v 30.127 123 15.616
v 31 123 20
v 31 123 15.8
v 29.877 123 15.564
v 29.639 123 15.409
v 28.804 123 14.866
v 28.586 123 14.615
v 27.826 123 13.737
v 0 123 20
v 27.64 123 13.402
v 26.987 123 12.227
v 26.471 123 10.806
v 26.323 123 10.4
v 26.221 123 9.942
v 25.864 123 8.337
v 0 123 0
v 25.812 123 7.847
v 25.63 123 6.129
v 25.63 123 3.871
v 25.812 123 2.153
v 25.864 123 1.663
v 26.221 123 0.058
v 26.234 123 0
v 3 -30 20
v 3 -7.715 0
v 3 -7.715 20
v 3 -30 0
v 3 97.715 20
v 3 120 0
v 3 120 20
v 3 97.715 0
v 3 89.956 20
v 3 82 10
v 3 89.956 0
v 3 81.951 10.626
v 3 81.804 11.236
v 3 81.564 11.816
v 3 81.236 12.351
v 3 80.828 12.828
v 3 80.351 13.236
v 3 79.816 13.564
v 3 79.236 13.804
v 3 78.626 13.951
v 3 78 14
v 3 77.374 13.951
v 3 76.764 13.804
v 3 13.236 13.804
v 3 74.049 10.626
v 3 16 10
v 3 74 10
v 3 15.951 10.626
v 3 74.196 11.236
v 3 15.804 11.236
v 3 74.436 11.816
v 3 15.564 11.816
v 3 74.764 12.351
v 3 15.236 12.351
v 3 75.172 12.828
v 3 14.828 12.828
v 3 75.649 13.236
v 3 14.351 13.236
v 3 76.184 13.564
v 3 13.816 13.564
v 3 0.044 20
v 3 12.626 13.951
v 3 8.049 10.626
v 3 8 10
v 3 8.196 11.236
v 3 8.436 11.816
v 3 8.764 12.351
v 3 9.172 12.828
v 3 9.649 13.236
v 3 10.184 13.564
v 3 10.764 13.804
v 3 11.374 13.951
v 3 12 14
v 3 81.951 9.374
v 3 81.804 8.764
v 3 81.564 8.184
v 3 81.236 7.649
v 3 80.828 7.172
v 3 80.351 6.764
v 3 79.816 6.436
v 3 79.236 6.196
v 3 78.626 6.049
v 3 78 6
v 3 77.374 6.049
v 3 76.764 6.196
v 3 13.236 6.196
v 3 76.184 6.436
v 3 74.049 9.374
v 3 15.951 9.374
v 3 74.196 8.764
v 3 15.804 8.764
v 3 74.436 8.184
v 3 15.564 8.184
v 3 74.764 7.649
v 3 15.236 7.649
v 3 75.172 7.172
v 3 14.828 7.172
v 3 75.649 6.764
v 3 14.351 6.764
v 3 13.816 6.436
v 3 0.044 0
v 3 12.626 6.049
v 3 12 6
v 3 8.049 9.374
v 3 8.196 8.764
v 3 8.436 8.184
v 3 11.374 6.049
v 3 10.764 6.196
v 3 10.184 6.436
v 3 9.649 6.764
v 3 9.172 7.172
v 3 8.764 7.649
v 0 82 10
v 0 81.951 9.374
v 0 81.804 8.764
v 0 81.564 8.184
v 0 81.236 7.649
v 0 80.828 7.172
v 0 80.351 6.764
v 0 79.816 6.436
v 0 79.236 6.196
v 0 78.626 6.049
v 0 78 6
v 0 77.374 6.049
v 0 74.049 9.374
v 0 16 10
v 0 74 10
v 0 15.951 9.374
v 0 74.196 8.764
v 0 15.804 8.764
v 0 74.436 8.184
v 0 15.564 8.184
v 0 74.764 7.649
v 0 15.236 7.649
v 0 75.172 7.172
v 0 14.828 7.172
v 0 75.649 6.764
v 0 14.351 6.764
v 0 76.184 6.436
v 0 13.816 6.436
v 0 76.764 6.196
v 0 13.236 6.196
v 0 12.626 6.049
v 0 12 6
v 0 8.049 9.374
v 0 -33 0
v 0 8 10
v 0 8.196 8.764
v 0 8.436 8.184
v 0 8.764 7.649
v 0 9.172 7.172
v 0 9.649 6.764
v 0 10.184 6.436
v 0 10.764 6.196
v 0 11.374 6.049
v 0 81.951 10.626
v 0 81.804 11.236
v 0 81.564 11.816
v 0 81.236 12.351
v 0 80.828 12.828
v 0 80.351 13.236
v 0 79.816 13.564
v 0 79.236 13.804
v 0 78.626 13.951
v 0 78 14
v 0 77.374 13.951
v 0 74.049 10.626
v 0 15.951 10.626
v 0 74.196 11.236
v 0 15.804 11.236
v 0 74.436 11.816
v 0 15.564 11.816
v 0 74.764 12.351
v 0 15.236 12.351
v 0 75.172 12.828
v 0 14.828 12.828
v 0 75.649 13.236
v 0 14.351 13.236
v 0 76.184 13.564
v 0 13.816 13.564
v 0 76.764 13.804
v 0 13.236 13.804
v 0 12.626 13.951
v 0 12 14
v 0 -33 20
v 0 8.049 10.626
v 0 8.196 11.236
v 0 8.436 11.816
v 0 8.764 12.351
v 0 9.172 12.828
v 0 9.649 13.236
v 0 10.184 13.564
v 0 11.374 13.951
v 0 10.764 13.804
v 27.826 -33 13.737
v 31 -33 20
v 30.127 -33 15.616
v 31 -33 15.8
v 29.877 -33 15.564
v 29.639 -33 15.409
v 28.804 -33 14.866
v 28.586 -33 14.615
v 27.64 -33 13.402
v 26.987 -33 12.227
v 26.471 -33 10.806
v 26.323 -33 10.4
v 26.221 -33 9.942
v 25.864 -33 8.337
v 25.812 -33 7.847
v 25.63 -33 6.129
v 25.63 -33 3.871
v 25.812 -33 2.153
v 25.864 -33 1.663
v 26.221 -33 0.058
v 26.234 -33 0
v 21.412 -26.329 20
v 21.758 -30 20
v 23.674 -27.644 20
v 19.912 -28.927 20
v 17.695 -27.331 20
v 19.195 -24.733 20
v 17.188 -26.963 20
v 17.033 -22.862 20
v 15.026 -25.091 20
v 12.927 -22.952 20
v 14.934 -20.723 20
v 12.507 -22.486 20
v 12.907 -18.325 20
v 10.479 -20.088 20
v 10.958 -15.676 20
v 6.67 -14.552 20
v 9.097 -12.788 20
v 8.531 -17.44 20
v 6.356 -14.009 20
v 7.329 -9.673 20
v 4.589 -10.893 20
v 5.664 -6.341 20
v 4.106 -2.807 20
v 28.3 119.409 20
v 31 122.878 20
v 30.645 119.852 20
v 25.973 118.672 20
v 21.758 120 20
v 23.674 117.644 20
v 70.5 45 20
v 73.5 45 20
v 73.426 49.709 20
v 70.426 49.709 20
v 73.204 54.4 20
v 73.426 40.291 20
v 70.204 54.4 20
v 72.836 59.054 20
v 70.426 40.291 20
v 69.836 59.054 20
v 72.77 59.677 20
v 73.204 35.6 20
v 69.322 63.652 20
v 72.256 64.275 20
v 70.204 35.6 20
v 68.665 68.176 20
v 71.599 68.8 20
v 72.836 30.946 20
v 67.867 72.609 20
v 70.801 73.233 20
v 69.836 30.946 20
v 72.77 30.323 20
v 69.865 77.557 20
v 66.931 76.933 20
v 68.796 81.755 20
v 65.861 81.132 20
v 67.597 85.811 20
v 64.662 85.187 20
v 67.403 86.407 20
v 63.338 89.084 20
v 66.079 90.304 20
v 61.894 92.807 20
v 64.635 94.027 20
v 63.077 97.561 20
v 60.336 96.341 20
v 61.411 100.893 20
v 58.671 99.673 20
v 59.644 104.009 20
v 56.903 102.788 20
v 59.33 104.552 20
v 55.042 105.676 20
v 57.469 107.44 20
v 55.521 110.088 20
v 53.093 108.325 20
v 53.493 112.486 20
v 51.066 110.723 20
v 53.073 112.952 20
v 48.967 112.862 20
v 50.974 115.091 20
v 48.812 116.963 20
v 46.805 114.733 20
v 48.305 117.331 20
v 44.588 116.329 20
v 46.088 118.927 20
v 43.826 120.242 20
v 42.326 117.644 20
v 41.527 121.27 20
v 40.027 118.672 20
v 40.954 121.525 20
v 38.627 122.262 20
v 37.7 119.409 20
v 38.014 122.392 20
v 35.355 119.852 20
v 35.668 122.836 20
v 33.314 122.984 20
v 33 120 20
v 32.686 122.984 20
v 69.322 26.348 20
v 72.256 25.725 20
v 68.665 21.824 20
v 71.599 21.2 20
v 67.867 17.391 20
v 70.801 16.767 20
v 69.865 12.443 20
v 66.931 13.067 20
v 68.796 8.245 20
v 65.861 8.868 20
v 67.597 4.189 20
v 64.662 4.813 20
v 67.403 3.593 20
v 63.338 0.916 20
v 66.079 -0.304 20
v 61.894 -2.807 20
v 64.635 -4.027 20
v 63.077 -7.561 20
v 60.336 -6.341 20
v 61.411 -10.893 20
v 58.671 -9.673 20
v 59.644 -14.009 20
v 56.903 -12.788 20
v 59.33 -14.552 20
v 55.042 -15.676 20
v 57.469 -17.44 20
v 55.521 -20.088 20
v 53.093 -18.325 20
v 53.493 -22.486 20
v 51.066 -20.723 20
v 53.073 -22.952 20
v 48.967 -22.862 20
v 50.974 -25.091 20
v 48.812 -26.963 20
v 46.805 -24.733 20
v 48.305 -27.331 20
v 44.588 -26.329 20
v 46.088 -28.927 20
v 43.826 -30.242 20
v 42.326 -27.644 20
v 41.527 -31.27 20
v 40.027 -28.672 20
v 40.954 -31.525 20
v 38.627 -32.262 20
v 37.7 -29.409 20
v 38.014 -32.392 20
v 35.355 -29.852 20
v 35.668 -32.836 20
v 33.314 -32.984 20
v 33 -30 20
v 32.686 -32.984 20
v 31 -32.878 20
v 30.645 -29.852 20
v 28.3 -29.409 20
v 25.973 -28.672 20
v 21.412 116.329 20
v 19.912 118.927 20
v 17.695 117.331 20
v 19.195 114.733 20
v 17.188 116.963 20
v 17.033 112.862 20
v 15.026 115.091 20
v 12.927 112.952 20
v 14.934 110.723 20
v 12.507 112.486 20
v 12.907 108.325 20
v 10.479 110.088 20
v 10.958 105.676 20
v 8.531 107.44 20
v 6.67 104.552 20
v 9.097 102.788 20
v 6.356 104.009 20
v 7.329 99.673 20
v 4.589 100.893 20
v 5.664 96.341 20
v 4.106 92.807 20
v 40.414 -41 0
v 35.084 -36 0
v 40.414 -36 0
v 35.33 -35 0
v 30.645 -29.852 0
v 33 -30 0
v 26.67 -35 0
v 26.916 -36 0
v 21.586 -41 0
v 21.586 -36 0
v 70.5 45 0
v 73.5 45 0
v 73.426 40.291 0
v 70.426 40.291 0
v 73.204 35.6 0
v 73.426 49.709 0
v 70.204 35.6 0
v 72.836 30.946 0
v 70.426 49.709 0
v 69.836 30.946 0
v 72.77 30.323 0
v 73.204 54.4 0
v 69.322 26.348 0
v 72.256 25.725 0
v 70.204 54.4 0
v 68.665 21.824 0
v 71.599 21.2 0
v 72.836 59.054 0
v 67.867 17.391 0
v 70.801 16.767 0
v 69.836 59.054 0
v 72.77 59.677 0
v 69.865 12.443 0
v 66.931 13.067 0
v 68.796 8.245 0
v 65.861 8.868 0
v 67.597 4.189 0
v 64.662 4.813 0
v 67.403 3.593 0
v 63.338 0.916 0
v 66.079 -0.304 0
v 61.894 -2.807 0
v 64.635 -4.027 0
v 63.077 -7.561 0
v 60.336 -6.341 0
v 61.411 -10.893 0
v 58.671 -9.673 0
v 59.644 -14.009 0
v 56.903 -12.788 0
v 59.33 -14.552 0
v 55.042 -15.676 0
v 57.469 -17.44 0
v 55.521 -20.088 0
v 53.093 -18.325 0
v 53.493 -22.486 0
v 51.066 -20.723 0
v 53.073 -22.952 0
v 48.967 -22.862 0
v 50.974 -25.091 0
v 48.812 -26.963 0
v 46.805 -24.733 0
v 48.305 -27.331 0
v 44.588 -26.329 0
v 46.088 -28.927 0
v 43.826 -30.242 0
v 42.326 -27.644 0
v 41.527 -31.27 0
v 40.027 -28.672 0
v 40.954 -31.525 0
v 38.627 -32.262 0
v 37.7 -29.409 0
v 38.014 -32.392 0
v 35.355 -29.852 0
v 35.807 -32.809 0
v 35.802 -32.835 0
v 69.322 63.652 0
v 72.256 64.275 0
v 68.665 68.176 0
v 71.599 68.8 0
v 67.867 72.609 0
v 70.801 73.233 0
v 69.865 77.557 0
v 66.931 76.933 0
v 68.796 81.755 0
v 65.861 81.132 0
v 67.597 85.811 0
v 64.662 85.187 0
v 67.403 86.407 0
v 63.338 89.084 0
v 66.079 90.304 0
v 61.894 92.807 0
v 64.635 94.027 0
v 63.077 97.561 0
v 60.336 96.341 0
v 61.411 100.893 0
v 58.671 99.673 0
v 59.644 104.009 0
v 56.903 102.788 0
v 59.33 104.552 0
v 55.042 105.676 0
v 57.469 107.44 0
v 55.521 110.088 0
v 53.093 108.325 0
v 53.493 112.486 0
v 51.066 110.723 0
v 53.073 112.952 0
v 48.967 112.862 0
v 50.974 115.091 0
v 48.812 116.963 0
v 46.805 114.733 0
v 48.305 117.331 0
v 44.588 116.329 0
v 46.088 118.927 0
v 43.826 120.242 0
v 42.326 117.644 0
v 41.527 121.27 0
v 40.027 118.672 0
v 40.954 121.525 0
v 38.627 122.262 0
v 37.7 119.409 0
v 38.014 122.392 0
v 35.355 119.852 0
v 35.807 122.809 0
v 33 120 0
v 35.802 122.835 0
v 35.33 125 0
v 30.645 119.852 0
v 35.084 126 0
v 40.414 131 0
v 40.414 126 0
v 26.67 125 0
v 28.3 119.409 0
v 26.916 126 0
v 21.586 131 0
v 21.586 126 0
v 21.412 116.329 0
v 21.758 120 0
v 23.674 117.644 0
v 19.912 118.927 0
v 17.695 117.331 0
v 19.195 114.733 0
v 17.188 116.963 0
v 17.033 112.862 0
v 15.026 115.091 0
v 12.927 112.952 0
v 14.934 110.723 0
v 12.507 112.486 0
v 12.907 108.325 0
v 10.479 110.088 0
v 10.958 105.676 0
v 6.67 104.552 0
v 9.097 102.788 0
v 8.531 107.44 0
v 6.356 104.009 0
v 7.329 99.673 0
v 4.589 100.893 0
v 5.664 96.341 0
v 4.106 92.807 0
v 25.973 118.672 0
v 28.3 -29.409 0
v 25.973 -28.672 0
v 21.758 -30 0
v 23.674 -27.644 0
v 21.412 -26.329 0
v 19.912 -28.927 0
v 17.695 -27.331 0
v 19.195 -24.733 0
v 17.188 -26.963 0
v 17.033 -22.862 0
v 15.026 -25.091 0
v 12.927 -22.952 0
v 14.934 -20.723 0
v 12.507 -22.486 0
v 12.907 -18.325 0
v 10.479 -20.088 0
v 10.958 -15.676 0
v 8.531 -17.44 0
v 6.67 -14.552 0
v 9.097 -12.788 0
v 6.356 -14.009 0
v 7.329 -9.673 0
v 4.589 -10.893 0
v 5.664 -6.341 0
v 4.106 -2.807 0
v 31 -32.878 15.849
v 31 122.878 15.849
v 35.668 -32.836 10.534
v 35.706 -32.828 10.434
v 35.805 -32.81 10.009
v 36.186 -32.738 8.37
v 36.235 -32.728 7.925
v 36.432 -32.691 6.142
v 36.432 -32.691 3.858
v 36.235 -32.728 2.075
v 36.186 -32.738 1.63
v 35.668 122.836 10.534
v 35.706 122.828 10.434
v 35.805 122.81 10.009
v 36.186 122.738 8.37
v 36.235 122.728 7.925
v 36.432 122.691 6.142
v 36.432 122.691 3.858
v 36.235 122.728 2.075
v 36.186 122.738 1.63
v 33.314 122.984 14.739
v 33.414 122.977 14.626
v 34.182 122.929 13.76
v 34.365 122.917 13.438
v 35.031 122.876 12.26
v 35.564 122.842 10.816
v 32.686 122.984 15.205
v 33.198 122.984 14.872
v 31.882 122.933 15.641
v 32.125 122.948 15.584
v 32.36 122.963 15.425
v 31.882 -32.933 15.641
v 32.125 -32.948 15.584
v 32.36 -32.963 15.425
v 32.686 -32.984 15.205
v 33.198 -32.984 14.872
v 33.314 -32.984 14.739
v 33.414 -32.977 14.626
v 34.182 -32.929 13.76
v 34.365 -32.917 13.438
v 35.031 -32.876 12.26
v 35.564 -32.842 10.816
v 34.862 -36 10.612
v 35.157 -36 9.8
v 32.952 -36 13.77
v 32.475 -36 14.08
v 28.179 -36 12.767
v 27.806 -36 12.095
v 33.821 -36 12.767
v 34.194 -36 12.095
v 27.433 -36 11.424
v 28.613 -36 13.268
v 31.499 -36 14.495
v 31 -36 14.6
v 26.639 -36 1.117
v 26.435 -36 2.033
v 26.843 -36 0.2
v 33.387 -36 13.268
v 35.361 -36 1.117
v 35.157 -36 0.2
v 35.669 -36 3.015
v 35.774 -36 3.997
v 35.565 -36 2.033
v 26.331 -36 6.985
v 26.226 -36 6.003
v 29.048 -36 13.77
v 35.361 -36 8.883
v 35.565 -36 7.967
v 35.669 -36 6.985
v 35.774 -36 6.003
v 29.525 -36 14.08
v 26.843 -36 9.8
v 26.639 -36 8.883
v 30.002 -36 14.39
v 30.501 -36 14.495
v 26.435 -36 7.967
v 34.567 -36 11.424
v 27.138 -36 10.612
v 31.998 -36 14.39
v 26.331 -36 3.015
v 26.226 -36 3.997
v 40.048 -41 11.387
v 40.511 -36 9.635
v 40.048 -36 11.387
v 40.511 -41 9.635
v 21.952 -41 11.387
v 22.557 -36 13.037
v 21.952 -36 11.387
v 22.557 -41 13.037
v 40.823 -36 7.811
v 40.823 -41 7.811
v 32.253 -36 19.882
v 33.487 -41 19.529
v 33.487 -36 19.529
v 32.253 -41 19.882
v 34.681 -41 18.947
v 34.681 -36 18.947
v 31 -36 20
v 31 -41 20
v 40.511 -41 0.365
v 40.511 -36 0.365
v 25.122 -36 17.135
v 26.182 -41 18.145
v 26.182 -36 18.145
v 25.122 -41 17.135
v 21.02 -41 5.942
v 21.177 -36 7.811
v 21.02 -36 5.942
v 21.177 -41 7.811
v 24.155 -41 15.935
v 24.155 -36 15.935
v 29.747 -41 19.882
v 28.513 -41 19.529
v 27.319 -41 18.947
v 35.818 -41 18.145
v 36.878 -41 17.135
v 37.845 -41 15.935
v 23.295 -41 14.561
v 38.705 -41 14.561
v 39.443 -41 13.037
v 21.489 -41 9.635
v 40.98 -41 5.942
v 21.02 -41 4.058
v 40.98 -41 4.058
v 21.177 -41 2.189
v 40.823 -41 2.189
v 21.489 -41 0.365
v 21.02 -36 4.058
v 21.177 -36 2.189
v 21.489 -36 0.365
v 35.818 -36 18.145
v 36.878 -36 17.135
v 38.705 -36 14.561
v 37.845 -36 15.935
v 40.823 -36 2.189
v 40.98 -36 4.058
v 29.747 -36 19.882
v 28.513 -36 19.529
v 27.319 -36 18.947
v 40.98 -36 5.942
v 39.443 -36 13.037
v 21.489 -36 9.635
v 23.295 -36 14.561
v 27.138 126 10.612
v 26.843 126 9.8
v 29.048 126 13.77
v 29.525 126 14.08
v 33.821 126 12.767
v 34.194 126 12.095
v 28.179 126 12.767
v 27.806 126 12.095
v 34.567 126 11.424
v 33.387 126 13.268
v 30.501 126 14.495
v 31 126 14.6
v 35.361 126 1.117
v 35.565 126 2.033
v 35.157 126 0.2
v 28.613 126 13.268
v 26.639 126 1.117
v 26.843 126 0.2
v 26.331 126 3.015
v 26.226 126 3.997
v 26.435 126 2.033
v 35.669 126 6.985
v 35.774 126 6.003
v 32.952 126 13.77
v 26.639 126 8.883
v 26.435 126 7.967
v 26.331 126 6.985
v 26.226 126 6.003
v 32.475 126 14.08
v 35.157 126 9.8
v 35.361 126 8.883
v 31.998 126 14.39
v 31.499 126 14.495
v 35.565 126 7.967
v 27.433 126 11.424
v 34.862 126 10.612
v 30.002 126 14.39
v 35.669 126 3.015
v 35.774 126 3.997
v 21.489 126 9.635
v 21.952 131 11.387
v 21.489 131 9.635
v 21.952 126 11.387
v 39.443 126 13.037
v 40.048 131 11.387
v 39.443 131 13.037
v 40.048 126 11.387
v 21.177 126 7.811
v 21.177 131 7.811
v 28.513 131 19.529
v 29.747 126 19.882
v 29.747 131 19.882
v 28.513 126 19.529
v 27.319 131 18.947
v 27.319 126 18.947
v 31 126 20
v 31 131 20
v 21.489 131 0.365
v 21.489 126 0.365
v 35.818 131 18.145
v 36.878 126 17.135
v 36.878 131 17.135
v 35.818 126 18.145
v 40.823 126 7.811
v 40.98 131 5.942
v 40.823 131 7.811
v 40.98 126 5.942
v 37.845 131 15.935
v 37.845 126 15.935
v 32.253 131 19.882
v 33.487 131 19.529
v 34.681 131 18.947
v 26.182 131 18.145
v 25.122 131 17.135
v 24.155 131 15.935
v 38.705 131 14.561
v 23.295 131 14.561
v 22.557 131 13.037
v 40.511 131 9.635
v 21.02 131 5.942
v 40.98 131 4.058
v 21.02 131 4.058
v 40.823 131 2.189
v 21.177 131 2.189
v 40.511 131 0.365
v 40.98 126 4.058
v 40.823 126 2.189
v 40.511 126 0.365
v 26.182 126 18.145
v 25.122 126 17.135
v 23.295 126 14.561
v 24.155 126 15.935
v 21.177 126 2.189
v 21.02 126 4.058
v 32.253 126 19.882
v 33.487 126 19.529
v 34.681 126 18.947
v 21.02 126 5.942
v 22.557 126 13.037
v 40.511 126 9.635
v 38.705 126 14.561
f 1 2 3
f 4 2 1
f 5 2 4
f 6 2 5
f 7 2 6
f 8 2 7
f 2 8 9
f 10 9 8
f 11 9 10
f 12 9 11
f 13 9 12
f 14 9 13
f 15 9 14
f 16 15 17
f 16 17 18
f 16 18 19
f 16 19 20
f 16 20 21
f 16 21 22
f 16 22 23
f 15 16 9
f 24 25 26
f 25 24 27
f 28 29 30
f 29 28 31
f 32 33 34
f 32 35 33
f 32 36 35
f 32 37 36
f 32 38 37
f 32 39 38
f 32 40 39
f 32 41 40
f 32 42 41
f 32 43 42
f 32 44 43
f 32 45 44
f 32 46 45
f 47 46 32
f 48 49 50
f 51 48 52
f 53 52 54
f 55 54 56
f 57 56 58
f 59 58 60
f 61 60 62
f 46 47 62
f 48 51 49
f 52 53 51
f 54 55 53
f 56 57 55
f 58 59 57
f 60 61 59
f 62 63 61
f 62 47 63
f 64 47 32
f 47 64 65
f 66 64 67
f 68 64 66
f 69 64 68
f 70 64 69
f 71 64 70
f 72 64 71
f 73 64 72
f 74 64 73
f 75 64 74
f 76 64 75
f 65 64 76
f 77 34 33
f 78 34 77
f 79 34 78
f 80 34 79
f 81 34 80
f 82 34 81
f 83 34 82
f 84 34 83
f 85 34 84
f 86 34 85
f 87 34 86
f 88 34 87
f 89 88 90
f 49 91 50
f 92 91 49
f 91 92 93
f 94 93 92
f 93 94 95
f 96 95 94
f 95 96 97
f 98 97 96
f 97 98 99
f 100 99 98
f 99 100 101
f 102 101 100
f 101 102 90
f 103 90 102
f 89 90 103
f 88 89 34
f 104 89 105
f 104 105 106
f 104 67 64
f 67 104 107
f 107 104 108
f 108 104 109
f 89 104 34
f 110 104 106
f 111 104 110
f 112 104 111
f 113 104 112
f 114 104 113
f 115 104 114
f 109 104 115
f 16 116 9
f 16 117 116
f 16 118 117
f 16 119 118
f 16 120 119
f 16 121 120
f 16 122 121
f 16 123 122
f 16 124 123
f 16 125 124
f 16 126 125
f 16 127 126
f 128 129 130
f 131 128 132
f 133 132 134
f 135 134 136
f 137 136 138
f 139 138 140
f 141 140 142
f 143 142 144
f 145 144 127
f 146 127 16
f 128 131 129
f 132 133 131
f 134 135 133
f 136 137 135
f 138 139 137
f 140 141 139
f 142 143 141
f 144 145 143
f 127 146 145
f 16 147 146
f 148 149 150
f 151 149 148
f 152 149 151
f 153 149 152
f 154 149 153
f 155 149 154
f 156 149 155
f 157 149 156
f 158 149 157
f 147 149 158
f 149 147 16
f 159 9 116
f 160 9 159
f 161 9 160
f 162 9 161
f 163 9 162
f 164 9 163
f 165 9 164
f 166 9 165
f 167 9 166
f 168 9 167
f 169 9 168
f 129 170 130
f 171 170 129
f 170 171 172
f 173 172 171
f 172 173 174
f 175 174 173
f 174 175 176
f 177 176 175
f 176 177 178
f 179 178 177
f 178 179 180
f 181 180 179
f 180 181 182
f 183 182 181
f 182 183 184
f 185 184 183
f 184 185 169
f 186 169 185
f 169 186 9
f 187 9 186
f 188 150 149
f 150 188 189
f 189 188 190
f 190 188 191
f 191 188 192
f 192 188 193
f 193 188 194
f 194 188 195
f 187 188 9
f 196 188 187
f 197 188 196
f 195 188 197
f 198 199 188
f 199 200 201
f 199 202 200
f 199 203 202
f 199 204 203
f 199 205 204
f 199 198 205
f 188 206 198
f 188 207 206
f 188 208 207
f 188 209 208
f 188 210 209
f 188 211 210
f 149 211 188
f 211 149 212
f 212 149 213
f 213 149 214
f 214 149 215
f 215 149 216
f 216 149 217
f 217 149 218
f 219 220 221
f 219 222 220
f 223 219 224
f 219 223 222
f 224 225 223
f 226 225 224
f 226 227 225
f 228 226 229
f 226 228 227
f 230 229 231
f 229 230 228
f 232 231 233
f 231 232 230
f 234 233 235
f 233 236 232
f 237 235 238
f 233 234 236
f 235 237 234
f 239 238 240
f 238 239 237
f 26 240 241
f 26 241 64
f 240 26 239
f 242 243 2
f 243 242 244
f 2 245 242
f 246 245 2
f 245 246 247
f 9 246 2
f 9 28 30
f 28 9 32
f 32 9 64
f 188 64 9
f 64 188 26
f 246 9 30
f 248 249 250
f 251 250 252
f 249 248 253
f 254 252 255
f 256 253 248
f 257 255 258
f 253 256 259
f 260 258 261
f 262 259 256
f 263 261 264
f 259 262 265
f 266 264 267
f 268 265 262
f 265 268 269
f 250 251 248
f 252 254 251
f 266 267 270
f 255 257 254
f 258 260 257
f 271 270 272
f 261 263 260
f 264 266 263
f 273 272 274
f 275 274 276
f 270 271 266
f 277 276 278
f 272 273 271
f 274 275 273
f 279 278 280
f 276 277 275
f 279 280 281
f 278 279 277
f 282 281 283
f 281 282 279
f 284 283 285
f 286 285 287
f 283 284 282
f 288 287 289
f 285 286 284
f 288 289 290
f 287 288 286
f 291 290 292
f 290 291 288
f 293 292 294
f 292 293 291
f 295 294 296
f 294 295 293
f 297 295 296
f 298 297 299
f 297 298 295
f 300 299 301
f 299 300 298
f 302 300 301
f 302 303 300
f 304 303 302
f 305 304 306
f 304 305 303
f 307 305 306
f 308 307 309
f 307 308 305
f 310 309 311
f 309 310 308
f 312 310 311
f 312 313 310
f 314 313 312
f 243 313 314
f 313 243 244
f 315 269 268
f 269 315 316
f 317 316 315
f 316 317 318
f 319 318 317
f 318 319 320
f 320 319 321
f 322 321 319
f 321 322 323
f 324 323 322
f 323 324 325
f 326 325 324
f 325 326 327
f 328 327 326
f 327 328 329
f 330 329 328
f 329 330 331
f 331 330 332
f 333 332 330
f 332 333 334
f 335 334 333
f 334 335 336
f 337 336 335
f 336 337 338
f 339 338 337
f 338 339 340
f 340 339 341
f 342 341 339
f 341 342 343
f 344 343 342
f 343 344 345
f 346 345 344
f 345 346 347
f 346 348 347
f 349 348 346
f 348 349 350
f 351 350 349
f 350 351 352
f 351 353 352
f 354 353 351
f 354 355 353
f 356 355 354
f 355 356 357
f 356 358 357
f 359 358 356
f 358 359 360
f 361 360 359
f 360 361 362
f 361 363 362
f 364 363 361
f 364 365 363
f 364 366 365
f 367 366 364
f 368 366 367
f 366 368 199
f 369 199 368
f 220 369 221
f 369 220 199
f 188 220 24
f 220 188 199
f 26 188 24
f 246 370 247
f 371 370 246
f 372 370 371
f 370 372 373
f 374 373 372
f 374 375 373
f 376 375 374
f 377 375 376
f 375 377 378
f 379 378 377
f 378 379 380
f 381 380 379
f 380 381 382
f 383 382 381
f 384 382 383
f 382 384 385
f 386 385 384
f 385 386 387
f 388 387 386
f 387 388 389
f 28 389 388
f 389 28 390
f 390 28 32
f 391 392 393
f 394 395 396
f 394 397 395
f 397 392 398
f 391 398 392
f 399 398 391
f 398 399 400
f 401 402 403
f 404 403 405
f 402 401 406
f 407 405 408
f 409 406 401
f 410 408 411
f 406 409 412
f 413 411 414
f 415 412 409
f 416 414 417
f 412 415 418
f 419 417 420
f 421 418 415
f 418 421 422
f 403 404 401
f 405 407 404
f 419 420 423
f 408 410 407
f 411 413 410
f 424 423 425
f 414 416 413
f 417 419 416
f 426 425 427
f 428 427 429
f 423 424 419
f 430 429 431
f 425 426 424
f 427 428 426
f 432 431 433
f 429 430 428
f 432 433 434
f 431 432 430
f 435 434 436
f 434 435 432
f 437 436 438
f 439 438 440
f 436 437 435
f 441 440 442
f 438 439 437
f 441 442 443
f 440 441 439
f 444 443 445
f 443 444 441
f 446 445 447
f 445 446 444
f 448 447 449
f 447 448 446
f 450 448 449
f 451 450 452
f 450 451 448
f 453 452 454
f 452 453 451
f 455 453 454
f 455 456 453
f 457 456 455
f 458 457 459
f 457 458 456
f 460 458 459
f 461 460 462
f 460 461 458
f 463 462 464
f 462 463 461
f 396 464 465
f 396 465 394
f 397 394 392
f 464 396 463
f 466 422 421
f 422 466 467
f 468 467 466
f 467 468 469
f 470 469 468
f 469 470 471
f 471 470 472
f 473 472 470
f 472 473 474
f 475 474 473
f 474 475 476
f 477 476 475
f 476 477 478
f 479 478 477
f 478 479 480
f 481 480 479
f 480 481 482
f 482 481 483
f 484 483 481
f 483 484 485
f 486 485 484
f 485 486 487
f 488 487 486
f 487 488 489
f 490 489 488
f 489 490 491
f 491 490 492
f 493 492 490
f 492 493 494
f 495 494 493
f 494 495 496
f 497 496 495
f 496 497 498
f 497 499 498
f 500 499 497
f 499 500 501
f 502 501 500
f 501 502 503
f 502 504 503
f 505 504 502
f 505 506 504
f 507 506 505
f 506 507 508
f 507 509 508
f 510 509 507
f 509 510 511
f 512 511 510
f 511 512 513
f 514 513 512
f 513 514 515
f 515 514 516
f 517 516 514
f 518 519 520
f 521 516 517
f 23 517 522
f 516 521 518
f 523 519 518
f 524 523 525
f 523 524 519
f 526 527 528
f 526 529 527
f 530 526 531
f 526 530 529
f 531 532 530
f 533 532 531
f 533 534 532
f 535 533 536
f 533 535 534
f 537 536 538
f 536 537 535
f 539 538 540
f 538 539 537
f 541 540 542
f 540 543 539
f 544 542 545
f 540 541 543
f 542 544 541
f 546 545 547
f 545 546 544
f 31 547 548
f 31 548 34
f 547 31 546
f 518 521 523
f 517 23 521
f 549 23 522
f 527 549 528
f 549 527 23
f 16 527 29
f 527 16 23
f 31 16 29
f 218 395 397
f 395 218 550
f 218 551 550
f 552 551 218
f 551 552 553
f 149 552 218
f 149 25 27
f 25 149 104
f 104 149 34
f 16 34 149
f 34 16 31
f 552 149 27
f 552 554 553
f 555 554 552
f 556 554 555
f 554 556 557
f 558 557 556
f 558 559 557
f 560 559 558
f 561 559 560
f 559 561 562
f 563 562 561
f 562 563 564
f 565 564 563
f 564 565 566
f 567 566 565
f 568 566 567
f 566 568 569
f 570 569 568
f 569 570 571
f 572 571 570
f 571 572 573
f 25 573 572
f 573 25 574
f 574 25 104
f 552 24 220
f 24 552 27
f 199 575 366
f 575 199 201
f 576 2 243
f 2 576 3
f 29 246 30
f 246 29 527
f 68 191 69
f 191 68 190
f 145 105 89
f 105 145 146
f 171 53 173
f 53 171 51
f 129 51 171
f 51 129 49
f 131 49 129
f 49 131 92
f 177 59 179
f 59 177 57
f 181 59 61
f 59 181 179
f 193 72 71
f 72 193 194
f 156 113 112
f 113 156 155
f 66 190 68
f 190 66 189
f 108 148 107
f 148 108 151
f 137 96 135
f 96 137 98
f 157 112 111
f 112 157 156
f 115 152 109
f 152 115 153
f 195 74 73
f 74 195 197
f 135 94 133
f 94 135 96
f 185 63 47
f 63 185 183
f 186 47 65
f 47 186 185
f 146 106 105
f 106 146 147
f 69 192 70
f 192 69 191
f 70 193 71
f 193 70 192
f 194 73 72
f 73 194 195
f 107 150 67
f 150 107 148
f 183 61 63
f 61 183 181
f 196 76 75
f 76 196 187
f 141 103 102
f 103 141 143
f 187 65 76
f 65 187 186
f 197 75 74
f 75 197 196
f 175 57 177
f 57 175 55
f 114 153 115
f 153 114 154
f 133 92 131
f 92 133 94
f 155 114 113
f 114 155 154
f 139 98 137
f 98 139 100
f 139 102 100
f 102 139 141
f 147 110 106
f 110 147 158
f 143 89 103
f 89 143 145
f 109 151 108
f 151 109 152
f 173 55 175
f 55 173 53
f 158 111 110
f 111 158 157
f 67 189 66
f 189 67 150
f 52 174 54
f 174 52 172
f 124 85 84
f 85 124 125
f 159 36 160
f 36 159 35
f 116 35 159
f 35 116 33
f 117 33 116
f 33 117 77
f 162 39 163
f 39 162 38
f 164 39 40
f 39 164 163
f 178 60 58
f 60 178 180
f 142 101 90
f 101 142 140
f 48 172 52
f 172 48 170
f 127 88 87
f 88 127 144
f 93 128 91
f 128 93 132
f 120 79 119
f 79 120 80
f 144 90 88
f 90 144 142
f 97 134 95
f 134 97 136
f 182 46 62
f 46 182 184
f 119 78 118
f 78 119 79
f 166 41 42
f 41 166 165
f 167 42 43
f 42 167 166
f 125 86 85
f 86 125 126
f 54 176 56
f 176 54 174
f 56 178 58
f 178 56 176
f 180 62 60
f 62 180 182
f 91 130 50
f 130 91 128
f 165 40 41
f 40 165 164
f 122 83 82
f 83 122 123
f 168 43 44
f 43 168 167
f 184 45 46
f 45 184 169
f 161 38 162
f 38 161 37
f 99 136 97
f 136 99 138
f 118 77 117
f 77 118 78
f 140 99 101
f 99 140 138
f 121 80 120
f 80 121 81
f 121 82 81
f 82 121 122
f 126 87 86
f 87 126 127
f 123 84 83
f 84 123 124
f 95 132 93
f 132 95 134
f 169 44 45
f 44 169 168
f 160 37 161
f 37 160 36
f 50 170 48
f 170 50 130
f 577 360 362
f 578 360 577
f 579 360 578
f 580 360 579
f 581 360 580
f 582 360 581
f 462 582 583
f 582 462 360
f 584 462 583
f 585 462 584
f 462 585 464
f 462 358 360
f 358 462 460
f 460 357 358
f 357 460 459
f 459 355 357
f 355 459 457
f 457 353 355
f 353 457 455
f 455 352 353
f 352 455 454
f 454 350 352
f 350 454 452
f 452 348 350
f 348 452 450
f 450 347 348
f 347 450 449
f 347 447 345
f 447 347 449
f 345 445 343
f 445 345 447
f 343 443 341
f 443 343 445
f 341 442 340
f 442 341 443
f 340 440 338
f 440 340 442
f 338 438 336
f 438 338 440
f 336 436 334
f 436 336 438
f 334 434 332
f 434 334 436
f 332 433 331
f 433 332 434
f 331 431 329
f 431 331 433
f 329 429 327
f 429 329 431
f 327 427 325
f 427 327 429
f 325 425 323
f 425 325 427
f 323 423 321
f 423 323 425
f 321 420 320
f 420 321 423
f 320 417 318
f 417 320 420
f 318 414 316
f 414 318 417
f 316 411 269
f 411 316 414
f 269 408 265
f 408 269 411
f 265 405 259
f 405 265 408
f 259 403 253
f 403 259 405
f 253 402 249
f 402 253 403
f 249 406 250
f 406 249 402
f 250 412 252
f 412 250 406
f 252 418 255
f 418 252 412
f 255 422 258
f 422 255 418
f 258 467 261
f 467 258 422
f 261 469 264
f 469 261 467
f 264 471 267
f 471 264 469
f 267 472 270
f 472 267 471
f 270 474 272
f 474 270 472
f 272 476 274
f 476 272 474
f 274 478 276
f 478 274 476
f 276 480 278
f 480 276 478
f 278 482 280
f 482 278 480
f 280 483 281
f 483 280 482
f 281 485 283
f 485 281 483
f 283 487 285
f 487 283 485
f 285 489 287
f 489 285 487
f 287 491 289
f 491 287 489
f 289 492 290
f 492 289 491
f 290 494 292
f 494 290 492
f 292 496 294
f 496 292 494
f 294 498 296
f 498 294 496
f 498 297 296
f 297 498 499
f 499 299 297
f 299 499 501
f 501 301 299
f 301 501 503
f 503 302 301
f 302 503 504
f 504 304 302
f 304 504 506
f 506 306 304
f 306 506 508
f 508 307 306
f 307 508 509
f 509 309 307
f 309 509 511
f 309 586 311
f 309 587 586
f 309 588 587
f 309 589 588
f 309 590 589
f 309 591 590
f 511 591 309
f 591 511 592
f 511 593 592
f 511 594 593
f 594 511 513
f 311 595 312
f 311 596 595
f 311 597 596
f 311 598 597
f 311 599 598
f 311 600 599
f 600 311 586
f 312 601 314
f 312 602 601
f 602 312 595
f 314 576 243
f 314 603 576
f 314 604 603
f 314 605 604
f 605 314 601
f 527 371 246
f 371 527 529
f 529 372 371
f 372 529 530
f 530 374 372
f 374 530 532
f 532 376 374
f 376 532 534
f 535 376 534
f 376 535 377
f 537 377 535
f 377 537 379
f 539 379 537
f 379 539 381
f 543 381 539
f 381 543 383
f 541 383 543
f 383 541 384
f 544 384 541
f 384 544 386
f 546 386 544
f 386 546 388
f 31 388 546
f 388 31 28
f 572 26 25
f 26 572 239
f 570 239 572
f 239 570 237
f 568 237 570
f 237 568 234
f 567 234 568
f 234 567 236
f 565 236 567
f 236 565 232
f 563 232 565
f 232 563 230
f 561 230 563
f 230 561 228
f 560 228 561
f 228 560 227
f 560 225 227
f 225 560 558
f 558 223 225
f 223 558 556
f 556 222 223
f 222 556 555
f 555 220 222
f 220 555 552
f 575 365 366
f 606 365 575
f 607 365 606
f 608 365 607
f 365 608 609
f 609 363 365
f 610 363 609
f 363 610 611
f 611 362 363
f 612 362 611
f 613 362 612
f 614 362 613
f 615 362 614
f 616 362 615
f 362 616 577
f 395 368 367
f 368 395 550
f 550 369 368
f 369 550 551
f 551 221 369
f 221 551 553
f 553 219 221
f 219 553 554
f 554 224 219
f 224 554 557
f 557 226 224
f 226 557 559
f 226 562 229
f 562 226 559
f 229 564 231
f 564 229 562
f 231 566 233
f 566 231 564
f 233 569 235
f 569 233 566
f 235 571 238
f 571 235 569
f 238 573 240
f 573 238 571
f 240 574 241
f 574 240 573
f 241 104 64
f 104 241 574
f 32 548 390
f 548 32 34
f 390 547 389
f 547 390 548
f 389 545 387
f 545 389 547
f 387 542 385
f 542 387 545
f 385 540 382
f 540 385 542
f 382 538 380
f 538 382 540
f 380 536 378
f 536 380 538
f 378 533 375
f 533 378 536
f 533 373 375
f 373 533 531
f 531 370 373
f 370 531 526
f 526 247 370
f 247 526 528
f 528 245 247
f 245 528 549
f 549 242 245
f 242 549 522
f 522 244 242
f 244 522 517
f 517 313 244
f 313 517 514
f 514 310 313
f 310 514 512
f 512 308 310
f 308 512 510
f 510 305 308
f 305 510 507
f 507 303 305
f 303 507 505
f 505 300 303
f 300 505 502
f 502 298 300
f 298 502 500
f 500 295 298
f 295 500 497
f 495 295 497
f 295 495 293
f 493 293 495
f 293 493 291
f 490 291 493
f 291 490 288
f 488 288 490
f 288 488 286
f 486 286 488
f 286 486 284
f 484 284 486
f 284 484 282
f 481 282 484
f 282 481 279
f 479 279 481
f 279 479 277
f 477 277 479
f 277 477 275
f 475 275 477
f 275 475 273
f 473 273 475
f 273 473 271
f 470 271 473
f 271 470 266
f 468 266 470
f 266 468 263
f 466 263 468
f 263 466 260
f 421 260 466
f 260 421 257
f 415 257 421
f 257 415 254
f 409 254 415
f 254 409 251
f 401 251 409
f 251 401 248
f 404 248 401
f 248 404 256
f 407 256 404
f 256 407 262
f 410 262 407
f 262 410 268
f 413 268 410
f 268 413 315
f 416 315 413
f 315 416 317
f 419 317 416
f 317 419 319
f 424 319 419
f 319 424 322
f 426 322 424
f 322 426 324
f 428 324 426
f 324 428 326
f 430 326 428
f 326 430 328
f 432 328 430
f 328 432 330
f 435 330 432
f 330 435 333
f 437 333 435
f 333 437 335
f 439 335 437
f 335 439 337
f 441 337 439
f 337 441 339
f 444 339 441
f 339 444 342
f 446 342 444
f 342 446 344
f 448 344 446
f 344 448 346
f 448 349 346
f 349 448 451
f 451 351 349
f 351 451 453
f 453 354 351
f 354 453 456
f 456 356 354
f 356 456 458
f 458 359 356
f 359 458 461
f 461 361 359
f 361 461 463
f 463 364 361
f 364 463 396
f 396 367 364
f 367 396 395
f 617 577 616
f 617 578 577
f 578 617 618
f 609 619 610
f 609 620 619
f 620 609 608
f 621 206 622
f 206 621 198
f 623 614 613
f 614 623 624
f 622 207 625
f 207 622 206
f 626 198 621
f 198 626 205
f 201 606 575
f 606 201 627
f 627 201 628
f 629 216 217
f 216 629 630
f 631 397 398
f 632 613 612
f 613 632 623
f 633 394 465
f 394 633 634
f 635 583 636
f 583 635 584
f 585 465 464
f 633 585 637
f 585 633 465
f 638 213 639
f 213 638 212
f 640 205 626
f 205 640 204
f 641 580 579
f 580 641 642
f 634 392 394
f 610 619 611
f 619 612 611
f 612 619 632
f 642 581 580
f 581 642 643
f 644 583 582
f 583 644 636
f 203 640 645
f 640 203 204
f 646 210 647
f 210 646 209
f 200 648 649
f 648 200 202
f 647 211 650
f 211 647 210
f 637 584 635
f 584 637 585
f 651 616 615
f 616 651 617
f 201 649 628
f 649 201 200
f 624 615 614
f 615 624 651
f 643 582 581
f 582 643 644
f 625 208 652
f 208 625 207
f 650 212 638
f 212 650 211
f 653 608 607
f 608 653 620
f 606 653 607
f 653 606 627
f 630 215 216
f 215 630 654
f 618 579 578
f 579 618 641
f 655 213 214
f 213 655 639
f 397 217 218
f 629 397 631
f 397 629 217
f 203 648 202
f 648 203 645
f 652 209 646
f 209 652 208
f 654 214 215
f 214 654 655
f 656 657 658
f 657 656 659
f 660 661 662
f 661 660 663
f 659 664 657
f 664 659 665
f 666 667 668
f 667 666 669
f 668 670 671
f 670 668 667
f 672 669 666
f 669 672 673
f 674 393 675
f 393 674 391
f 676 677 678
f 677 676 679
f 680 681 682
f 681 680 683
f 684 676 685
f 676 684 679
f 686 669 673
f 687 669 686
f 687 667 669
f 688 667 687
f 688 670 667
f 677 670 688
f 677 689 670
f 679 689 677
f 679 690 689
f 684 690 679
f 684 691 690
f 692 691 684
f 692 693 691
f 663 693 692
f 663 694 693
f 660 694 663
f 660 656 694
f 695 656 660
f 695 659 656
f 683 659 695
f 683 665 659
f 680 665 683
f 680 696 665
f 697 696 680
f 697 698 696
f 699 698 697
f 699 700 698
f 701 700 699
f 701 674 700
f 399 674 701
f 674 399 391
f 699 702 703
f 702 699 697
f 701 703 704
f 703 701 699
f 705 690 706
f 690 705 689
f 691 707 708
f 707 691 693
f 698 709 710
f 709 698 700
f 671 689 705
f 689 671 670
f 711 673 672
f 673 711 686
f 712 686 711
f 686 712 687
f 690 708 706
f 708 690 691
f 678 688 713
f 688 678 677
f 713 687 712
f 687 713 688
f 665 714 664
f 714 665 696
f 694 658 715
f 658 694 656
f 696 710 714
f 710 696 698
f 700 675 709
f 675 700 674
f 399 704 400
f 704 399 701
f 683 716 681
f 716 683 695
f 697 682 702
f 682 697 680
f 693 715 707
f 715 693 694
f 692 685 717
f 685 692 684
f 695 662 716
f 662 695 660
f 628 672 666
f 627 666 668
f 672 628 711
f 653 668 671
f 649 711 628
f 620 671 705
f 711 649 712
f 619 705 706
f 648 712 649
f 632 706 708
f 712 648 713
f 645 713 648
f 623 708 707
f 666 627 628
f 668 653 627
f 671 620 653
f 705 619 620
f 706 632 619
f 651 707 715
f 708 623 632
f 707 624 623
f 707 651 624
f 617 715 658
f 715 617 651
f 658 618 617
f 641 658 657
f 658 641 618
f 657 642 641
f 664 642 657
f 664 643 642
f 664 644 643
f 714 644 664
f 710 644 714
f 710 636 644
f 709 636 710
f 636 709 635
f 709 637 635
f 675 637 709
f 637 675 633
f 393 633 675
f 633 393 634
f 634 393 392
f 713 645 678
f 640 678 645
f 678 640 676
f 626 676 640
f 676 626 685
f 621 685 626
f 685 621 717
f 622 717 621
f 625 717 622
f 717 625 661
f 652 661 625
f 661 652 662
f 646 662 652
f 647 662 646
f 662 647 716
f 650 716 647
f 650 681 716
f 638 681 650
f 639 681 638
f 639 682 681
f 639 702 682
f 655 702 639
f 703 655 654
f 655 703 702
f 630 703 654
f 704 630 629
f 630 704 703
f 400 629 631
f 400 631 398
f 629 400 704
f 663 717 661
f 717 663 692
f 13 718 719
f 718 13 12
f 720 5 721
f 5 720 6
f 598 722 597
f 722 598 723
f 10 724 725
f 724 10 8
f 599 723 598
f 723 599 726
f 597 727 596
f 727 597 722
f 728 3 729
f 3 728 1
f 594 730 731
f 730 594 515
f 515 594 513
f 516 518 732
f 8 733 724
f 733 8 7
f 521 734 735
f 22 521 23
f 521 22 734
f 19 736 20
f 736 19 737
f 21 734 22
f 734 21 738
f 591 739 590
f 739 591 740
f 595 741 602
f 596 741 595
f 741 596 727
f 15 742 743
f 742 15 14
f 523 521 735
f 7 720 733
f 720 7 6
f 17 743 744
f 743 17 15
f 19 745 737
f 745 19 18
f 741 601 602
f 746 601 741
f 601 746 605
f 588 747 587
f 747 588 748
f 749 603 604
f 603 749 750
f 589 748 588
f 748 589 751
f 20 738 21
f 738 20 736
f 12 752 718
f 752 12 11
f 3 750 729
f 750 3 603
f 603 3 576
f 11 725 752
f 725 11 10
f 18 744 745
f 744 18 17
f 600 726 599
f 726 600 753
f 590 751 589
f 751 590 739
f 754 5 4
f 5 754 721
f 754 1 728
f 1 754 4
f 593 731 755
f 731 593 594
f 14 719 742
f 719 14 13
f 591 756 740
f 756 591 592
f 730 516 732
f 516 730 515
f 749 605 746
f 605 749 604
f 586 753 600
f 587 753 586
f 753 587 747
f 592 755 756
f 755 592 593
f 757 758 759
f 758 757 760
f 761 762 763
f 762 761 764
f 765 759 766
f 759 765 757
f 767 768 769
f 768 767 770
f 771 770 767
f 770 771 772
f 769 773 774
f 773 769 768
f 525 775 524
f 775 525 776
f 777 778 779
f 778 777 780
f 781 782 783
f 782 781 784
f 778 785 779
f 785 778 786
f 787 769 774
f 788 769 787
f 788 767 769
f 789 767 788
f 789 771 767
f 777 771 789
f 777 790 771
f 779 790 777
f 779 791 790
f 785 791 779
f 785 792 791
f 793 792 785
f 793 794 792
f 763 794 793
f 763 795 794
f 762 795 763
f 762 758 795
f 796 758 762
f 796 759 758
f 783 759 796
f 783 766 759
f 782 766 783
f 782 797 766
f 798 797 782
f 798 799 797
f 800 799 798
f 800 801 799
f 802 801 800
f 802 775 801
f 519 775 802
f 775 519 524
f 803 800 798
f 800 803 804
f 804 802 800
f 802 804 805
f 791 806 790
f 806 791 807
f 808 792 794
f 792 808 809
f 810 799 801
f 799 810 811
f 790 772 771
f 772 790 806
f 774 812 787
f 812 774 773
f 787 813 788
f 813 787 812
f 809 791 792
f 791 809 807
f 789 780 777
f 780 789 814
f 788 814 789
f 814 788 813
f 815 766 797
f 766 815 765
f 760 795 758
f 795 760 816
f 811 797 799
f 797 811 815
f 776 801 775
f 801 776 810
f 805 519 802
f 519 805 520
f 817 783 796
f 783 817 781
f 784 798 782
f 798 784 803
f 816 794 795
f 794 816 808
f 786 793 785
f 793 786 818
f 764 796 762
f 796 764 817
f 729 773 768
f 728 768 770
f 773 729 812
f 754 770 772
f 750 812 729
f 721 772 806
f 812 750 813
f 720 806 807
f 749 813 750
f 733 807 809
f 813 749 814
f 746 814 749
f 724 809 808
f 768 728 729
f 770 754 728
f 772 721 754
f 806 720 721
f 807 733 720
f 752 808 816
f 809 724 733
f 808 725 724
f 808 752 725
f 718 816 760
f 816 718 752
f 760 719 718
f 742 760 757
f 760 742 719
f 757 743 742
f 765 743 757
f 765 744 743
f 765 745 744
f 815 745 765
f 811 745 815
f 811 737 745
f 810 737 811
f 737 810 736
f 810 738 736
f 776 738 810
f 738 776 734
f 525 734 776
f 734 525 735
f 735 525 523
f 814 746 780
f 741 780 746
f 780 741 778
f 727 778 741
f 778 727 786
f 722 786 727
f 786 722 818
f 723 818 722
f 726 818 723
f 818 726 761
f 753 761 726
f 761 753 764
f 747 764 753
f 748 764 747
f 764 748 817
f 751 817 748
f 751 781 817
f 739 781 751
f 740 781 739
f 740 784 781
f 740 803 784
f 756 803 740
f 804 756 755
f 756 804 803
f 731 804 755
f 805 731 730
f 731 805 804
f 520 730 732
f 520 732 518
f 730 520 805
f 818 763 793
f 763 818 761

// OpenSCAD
rotate([0,0,90]) rotate([90,0]) difference(){
  translate([-33,0]) {
    cube([156,20,3]);
    cube([3,20,31]);
    translate([153,0]) cube([3,20,31]);
  }
  for(x=[12,78])
    translate([x,10,-.01])
      cylinder(d=8,h=3.02,$fn=40);
}
//difference()
{
  intersection(){
    translate([1,-50]) cube([180,200,20]);
    union(){
      translate([33,45]) linear_extrude(20,convexity=2) outline(3) scale([.5,1]) circle(d=150,$fn=100);
    *translate([31,45]) difference(){
      scale([.5,1,1]) cylinder(d=150,h=20,$fn=200);
      translate([0,0,-.01])
        scale([.5,1,1]) cylinder(d=144,h=20.02,$fn=200);
      }
    }
  }
  intersection() {
    translate([0,-50]) cube([180,200,20]);
    translate([31,45]) for(r=[-90,90]) rotate([0,0,r]) translate([r!=0?75:36,0,5]) rotate([0,90]) {
      scale([2,1]) cylinder(d1=12,d2=8,h=10,$fn=30);
      translate([0,0,6]) scale([1.5,1]) cylinder(d=20,h=5,$fn=50);
    }
  }
}

module outline(t=2)
{
  difference() {
    minkowski() {
      children();
      circle(r=t,$fn=30);
    }
    children();
  }
}
